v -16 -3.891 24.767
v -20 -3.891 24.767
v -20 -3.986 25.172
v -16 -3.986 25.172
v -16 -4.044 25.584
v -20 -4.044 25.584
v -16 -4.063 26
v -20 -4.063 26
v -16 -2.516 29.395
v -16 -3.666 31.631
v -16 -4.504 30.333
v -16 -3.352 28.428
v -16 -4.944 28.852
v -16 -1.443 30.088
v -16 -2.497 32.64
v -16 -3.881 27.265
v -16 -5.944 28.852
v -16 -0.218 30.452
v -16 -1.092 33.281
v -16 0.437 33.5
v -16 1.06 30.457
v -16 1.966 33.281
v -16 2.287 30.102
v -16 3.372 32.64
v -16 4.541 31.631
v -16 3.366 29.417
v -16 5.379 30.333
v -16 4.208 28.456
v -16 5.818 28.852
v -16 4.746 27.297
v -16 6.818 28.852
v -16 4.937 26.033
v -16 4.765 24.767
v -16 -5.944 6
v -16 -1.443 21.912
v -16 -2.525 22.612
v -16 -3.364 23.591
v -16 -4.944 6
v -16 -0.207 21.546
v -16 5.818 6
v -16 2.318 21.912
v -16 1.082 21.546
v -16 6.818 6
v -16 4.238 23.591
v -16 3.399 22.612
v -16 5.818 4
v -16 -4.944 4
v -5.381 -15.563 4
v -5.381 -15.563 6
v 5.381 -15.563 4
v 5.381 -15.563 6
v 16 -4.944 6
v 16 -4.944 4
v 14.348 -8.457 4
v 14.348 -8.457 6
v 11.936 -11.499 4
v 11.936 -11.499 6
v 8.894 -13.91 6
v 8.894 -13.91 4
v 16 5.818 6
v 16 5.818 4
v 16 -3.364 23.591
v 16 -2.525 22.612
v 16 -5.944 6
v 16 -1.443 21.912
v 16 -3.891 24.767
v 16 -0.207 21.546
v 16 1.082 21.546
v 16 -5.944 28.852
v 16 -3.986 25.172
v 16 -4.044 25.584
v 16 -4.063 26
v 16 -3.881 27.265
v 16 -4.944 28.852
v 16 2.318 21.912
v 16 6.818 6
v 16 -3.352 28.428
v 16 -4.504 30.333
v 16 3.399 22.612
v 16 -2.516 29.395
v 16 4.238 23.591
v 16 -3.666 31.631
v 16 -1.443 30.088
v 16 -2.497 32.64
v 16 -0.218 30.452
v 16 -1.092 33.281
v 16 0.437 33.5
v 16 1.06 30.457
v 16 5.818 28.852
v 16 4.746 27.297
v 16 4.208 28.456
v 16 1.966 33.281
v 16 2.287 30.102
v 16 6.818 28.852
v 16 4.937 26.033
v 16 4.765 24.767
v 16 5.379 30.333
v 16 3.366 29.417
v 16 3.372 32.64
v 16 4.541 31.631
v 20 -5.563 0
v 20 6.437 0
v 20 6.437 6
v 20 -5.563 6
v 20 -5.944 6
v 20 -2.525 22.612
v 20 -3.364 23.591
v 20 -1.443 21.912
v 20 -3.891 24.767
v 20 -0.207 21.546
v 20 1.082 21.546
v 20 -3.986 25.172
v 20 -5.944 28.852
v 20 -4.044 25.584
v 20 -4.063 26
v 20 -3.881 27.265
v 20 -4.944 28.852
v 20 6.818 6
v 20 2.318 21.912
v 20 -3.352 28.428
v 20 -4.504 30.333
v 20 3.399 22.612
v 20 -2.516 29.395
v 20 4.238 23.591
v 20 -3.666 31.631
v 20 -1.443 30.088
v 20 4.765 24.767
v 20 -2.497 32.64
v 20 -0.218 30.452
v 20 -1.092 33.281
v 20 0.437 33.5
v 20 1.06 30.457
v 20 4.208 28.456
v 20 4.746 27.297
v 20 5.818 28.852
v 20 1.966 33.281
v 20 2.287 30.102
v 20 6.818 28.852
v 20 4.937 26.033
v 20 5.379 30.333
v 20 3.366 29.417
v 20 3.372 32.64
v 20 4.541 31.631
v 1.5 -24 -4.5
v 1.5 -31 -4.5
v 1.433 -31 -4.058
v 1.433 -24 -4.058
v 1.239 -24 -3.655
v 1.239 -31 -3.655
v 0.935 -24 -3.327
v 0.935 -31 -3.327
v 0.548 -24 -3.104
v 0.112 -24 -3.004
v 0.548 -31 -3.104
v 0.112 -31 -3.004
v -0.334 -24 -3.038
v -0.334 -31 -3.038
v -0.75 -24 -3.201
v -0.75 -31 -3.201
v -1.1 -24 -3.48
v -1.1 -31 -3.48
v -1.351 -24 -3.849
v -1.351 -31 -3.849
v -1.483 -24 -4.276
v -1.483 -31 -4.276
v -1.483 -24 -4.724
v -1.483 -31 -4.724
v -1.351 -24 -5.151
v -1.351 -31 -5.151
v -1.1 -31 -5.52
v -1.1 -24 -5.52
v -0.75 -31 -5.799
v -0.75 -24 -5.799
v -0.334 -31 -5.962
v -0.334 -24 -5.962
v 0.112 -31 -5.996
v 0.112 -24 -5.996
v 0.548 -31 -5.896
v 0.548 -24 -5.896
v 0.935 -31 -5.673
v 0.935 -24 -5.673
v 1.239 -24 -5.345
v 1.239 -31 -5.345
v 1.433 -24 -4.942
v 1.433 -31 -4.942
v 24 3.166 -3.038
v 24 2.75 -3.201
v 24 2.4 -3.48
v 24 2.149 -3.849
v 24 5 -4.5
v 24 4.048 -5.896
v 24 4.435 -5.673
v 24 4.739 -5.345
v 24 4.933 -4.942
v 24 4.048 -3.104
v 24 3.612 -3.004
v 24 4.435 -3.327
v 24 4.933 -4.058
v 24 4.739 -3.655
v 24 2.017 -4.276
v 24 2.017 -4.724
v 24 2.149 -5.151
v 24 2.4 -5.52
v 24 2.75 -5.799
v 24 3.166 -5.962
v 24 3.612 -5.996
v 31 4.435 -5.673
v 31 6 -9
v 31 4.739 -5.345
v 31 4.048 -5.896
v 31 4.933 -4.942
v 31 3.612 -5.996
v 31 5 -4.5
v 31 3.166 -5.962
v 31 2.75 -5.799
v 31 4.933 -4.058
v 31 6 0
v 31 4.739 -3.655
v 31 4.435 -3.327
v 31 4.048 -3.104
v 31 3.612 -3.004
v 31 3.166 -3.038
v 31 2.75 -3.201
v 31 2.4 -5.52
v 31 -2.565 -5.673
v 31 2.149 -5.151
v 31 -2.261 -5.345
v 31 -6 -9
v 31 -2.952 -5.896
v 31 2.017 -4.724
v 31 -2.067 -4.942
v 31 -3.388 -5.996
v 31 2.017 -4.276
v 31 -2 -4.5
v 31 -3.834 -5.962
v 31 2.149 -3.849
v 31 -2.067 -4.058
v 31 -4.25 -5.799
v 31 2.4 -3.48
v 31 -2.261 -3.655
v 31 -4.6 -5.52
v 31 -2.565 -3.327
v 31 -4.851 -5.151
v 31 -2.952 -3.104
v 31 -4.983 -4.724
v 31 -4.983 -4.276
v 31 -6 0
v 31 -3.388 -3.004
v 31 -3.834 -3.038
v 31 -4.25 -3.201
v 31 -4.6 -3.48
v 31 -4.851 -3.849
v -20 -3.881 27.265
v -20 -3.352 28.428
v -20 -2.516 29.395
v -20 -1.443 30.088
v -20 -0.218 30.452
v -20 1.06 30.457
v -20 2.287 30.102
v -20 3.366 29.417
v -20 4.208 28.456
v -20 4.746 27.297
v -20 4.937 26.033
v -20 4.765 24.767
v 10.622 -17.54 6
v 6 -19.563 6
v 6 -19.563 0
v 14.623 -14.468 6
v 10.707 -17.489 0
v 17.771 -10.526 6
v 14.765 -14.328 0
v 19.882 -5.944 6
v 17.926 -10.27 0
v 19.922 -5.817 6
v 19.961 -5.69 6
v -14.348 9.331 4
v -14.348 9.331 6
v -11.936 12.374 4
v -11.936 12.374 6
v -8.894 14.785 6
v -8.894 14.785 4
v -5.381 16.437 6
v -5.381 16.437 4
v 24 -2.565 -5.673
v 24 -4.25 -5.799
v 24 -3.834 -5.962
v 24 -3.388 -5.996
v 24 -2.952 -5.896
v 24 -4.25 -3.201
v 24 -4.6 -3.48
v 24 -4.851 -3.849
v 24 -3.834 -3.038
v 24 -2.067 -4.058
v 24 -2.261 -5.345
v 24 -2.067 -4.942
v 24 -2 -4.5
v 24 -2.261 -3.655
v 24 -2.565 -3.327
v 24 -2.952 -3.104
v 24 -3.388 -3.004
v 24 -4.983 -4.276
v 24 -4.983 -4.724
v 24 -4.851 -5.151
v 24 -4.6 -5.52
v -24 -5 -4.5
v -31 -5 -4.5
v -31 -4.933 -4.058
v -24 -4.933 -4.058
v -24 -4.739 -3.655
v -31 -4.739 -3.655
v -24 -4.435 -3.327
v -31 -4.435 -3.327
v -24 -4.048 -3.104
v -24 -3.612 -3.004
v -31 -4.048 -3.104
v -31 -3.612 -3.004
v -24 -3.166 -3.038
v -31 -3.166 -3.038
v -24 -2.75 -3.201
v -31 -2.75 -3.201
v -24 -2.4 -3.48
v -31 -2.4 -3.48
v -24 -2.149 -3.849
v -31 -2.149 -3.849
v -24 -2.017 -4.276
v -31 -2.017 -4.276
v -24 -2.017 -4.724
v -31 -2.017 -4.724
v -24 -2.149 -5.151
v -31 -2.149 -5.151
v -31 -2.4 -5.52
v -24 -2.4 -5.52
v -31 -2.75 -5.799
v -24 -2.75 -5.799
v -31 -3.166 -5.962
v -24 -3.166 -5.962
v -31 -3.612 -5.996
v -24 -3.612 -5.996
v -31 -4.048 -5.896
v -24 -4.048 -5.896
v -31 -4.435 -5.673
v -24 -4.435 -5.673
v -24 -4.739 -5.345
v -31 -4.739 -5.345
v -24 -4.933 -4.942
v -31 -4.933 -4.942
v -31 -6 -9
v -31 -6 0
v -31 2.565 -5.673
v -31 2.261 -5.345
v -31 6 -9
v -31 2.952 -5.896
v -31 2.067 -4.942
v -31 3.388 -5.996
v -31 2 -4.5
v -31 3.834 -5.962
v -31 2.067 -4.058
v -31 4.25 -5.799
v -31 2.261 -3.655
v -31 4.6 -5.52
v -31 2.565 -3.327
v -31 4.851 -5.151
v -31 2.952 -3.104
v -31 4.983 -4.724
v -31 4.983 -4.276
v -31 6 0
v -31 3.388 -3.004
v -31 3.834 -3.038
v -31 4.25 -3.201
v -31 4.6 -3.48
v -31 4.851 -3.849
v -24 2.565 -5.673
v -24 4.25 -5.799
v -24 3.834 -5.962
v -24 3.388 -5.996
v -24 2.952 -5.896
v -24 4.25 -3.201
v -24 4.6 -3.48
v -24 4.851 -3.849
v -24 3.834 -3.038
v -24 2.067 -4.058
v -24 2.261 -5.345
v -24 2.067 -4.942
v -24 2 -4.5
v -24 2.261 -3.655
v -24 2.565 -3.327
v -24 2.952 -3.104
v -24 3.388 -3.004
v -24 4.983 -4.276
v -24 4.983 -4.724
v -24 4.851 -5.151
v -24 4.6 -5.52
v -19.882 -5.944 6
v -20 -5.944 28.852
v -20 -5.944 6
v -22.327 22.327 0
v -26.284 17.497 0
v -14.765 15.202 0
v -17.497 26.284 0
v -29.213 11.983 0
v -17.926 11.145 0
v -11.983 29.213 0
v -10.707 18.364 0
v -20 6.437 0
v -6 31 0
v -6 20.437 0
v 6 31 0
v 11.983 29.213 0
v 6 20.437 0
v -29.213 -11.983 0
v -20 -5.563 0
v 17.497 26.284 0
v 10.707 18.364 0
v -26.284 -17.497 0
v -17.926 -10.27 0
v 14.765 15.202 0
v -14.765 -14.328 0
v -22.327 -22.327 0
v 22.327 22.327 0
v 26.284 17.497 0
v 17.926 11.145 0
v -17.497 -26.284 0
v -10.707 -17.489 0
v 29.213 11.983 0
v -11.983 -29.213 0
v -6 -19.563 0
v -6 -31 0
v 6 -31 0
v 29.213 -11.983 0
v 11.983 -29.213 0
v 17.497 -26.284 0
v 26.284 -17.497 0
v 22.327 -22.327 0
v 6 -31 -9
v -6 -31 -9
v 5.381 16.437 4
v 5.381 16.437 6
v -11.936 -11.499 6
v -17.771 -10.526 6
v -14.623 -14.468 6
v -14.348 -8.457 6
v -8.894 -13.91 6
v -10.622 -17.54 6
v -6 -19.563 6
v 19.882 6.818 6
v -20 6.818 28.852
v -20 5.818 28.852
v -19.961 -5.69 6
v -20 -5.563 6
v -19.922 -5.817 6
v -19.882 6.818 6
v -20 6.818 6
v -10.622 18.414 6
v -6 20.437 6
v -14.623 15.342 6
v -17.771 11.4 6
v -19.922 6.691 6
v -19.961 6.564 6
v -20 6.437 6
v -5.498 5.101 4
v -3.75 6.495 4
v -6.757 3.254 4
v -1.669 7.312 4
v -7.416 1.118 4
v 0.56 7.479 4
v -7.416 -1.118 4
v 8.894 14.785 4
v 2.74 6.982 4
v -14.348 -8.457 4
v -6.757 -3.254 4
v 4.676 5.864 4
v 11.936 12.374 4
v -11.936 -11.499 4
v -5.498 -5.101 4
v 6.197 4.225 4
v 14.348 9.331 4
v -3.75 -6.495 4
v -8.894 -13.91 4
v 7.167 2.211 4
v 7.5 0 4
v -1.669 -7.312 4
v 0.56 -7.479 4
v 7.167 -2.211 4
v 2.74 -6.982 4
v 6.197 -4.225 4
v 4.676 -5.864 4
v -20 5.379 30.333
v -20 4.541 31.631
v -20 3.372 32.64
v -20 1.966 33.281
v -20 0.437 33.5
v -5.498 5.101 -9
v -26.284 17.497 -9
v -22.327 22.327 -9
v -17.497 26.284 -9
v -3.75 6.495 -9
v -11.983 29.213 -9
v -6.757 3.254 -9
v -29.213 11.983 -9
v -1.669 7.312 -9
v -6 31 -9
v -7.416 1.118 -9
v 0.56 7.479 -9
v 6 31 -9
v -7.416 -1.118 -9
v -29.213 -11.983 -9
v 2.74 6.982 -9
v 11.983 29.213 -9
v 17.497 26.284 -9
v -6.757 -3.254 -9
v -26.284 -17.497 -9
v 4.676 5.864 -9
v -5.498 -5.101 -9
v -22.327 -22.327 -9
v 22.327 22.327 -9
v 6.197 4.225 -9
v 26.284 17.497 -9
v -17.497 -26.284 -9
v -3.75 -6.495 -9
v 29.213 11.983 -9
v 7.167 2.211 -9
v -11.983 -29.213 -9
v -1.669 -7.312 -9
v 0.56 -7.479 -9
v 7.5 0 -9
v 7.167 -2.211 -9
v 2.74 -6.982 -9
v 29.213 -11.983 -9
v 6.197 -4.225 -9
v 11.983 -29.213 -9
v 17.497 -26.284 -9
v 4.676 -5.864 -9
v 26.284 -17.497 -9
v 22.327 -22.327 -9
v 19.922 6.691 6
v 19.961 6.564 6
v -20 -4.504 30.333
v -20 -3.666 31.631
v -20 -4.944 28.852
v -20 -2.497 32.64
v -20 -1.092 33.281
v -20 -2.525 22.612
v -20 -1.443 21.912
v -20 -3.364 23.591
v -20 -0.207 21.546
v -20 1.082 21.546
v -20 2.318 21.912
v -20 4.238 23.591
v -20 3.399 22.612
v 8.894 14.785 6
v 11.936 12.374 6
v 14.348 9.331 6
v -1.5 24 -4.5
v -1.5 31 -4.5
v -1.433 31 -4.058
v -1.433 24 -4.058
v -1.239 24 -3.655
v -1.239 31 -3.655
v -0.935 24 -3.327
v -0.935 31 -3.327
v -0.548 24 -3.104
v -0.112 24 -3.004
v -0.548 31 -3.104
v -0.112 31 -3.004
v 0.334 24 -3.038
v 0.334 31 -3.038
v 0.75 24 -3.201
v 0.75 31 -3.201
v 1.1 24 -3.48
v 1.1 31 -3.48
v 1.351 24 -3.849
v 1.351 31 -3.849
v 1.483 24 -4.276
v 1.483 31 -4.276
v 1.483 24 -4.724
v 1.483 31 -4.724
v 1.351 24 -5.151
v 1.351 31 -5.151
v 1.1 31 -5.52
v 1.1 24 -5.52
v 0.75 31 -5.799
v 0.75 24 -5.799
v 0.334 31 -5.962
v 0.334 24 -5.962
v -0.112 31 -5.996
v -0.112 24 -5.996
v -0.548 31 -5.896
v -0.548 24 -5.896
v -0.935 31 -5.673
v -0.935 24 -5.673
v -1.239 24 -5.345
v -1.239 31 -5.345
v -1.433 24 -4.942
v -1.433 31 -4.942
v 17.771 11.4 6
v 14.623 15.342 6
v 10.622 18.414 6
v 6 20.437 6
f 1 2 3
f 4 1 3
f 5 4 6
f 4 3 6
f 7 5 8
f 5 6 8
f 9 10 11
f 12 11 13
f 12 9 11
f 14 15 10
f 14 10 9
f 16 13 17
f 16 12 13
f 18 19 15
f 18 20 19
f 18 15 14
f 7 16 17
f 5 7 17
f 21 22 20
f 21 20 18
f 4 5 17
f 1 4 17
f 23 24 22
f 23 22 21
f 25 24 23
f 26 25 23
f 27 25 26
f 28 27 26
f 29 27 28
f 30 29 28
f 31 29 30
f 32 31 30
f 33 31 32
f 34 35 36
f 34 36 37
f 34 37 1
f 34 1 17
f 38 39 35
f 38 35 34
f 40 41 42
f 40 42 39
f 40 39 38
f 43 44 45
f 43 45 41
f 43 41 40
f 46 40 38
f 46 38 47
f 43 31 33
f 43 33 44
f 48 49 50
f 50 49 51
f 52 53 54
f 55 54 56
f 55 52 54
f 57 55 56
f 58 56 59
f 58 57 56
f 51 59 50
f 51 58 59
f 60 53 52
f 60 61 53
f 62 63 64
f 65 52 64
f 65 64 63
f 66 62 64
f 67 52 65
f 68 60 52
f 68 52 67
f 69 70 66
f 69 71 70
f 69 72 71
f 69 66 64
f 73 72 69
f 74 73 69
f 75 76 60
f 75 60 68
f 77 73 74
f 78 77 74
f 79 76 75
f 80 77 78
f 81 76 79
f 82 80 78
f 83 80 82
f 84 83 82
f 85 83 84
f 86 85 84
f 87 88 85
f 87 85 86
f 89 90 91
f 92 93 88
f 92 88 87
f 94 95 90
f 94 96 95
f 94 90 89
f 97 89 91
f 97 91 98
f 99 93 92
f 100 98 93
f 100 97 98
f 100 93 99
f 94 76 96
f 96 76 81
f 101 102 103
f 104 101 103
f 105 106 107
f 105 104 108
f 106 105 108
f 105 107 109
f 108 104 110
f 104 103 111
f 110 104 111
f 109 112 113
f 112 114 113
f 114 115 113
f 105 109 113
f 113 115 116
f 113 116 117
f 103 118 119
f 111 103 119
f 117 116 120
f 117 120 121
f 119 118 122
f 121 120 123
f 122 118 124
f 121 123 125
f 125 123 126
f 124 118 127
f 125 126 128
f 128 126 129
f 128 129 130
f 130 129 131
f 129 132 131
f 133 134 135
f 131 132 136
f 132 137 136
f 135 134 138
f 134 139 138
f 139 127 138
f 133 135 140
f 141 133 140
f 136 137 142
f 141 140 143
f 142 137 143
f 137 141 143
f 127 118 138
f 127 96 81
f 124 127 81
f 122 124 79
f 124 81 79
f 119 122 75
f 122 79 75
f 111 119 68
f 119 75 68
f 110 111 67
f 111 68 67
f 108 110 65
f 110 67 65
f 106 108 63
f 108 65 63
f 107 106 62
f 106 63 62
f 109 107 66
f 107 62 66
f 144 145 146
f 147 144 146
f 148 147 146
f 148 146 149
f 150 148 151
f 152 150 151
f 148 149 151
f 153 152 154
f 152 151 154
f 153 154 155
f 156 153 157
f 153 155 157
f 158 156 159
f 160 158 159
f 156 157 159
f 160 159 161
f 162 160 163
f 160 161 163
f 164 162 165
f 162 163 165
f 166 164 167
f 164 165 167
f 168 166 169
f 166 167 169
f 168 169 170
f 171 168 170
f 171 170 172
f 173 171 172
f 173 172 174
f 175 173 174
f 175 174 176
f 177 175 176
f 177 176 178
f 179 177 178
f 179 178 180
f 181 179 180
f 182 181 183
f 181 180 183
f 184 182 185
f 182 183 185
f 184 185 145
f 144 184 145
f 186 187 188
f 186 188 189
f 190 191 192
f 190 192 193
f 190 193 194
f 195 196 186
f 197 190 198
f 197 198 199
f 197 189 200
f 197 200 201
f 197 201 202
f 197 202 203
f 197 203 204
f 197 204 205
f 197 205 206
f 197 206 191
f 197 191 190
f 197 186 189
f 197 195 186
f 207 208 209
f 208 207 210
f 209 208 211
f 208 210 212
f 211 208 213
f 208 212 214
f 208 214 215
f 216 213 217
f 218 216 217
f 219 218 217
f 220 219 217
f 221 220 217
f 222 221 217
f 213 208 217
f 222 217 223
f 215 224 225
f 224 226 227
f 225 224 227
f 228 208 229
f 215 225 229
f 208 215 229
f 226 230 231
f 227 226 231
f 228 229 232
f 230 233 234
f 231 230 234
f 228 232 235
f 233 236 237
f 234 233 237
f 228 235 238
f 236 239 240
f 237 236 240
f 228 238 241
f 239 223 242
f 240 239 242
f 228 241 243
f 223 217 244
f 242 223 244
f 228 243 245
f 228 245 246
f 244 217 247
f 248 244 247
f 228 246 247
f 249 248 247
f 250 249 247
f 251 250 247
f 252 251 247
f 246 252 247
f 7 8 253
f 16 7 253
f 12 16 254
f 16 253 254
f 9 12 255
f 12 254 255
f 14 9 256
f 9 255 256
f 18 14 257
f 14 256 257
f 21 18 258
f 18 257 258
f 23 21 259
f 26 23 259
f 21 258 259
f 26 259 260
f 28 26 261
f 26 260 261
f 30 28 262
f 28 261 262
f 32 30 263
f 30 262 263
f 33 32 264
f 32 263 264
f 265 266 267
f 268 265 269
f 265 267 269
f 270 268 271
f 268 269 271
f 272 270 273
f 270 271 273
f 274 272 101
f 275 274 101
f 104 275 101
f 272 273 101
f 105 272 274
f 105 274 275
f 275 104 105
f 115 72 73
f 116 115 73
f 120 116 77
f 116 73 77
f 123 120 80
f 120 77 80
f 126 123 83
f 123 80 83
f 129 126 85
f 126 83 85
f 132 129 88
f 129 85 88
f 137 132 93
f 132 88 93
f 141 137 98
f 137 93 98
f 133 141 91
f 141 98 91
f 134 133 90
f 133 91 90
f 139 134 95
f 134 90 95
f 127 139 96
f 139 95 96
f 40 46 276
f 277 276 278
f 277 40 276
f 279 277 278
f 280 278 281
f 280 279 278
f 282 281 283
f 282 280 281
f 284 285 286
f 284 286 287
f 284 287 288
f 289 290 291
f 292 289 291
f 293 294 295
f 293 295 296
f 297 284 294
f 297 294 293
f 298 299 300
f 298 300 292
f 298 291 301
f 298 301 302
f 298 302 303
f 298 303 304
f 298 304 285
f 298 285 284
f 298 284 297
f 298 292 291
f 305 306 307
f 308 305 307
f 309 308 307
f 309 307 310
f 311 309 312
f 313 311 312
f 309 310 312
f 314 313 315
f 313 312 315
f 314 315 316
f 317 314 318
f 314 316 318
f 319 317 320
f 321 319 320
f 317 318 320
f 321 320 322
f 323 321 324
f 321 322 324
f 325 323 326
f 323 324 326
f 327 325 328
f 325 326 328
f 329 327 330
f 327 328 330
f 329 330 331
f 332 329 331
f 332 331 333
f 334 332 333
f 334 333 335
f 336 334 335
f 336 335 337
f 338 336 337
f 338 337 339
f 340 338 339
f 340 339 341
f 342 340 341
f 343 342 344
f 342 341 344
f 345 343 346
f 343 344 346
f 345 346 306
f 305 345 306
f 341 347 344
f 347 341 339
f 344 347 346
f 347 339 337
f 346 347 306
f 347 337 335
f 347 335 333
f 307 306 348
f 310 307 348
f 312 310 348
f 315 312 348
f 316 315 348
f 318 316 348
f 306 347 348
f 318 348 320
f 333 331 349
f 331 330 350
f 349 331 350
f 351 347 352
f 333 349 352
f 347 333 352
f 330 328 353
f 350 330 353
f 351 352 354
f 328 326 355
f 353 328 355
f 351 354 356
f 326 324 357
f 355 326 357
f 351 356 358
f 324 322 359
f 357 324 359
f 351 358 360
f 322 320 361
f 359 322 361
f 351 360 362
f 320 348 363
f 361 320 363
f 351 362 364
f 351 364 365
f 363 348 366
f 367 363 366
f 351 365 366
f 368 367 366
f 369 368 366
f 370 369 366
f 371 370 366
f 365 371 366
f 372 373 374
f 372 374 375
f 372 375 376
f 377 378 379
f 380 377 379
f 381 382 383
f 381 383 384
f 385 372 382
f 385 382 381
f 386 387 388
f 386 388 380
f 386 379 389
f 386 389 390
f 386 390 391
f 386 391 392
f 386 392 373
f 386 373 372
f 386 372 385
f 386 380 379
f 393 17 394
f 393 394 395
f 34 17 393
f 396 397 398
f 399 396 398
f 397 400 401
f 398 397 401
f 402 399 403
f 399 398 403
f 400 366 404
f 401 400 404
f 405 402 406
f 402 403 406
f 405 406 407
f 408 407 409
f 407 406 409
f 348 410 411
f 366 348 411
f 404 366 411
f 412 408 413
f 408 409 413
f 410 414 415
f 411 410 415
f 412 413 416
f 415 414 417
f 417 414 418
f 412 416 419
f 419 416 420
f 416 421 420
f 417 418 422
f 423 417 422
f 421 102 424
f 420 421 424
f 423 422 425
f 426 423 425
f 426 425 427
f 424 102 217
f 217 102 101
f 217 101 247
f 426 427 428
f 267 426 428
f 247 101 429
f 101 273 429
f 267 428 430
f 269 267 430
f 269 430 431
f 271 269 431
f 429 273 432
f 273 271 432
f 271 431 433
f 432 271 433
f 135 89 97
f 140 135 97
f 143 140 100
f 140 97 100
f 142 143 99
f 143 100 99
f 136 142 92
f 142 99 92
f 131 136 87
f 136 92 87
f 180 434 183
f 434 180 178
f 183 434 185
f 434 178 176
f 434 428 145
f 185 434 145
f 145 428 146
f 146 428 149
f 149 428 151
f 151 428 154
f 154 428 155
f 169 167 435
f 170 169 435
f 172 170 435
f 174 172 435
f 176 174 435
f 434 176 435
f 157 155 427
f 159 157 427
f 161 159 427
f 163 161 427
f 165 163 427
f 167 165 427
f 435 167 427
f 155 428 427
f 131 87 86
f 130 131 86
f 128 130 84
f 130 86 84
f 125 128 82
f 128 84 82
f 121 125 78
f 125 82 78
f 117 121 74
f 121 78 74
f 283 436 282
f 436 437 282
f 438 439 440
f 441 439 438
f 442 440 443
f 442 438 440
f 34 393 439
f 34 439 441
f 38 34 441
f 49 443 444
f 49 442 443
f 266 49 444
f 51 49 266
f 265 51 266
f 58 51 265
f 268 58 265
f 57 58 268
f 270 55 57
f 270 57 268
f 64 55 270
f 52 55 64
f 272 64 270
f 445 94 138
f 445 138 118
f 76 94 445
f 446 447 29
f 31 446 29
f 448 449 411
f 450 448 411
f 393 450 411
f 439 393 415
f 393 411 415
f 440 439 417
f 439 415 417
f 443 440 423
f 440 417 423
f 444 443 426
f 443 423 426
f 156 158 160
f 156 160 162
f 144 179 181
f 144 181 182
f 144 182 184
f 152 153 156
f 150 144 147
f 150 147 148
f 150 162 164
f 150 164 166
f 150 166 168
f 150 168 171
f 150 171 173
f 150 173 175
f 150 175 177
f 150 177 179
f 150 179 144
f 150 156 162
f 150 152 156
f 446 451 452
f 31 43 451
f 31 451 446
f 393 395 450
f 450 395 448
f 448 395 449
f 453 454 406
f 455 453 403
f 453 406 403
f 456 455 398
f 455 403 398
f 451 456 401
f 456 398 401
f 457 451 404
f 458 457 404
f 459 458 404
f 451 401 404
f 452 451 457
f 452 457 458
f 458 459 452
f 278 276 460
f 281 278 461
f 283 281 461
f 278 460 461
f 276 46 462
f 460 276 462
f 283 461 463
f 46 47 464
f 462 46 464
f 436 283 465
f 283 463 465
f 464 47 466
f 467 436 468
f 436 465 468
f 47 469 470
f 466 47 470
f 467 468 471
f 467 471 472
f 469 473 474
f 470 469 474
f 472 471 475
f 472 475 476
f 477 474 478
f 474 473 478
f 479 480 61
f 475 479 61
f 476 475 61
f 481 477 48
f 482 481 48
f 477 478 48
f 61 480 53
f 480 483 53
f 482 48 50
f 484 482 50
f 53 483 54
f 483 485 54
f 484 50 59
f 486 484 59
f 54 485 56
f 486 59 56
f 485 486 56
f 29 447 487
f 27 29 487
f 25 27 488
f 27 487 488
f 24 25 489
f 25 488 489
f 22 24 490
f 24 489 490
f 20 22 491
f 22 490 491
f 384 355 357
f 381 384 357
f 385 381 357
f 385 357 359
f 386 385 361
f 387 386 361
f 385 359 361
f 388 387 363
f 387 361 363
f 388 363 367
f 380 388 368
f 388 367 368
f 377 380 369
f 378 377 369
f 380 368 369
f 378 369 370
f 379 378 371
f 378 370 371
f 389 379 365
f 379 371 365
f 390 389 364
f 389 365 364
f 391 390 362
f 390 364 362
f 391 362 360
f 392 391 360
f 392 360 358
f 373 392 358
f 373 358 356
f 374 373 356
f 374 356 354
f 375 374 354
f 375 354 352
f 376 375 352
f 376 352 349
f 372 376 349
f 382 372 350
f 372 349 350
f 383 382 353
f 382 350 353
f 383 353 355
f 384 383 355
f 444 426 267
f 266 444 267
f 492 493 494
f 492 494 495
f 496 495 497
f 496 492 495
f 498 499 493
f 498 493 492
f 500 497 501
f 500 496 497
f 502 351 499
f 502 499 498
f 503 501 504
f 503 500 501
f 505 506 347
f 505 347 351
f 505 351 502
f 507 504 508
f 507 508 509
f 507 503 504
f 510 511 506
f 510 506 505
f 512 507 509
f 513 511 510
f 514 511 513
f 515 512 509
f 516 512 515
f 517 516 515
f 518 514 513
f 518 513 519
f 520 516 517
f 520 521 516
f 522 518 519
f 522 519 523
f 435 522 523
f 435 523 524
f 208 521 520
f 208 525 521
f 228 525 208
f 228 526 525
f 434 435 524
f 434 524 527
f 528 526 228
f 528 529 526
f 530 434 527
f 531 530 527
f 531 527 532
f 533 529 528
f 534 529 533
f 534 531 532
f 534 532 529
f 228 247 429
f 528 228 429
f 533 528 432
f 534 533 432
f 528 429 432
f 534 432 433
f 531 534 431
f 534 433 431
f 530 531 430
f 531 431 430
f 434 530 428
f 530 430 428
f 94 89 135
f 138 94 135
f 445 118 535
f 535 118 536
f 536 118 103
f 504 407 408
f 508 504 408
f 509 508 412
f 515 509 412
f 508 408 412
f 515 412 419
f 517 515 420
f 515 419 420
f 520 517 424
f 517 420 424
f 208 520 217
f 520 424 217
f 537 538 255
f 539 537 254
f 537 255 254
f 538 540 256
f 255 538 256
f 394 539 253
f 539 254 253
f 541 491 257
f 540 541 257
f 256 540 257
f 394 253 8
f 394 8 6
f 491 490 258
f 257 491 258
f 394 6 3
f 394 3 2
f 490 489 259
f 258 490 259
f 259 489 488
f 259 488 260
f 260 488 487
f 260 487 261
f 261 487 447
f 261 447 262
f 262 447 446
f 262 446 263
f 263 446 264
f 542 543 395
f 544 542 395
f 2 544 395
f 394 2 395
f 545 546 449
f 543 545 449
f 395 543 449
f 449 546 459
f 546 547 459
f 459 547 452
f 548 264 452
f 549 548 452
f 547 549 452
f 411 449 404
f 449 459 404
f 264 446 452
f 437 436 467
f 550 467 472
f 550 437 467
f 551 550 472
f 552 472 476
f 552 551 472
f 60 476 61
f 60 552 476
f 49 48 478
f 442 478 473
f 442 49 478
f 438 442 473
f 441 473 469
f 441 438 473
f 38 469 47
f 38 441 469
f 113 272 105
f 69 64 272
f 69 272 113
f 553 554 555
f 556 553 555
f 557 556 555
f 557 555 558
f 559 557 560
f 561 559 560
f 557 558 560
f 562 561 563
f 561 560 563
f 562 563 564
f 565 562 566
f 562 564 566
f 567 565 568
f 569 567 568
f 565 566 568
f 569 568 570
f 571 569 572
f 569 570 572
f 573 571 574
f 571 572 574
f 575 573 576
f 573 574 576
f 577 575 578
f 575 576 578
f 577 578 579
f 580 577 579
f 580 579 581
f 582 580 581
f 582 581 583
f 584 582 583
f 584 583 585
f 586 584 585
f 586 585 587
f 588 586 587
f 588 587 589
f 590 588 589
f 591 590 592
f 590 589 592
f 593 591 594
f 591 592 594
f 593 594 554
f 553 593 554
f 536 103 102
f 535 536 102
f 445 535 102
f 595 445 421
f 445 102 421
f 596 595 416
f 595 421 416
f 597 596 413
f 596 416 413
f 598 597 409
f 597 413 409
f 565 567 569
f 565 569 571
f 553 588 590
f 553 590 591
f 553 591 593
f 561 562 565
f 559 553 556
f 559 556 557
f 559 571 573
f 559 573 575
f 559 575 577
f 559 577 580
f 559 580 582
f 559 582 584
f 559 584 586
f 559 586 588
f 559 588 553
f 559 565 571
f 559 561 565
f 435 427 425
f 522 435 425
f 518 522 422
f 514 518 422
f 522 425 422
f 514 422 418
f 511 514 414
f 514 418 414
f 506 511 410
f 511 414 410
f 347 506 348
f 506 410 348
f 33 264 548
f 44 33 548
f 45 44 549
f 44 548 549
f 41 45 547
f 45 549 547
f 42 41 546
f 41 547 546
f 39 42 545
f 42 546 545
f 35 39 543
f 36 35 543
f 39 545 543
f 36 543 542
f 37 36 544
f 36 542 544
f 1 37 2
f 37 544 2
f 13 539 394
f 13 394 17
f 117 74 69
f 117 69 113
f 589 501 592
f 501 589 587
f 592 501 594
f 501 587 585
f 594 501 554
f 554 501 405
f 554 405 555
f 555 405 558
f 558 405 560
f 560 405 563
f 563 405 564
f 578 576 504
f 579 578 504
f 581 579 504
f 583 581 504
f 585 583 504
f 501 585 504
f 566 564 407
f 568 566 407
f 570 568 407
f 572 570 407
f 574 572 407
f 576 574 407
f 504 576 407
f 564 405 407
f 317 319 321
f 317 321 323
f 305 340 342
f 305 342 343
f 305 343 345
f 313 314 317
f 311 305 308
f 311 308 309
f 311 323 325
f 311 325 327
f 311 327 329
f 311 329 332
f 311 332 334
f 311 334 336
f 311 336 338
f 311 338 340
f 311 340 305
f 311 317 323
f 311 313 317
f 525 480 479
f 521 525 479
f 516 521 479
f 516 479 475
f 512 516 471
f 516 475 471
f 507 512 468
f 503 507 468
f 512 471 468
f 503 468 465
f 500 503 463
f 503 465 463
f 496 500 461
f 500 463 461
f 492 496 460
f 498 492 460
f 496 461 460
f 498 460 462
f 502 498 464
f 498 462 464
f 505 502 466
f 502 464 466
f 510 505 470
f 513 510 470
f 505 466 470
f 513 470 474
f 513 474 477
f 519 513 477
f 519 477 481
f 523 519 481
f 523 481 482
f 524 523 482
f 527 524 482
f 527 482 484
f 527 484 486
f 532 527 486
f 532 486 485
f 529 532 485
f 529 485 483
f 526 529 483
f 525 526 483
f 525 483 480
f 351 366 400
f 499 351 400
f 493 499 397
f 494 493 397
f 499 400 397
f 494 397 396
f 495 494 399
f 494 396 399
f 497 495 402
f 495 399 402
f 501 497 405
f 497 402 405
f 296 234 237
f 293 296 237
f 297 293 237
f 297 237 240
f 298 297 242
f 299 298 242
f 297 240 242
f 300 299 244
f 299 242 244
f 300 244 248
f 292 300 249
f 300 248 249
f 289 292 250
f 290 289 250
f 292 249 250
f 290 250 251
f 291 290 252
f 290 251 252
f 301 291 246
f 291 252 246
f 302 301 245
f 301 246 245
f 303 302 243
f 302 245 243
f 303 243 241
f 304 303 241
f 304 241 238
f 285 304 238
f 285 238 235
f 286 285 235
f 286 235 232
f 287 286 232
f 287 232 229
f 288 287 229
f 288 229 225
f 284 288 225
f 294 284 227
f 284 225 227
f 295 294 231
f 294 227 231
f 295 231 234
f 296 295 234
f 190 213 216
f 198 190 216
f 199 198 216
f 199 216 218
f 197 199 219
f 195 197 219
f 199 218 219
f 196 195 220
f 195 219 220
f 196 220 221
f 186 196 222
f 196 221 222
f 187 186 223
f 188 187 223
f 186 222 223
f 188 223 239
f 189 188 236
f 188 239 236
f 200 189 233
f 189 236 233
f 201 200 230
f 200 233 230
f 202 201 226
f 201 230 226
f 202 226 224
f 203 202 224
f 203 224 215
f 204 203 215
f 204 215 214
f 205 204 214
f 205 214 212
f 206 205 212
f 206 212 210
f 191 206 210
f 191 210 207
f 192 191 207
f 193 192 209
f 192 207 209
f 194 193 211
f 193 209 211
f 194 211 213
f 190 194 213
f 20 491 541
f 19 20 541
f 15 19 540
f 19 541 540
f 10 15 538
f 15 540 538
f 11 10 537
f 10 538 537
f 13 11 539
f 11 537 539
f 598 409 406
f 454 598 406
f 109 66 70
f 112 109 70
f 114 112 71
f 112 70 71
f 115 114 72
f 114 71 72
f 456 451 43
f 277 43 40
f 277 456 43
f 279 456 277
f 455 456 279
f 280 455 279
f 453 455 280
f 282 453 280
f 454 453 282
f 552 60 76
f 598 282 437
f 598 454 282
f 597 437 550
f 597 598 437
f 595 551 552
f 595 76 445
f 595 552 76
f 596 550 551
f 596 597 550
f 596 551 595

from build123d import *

# Parameters (mm, degrees)
F1_DEPTH  = 6
F2_T      = -4
F3_DEPTH  = 25.4
F4_W      = 10.761987894
F4_H      = 6
F4_H_2    = 27.5
F5_DEPTH  = 4
F6_W      = 10.761987894
F6_H      = 6
F6_H_2    = 27.5
F7_DEPTH  = 4
F9_DEPTH  = 50
F10_DEPTH = 50
F11_DEPTH = 50
F12_DEPTH = 1
F13_DEPTH = 1
F14_DEPTH = 1
F15_DEPTH = 1
F18_DEPTH = 4
F20_DEPTH = 9
F21_R     = 1.5
F22_DEPTH = 7
F23_R     = 1.5
F24_DEPTH = 7
F25_R     = 1.5
F26_DEPTH = 7
F27_R     = 1.5
F28_DEPTH = 7
F29_R     = 7.5
F30_DEPTH = 25.4


with BuildPart() as f1:
    # F0 (on Top) → F1 (new body)
    with BuildSketch(Plane.XY):
        with BuildLine():
            Line((6.0000014261, 20.4372135154), (1.4261e-06, 20.4372135154))
            Line((1.4261e-06, 20.4372135154), (-5.9999985739, 20.4372135154))
            ThreePointArc((-5.9999985739, 20.4372135154), (-14.7648216341, 15.2020365756), (-19.9999985739, 6.4372135154))
            Line((-19.9999985739, 6.4372135154), (-19.9999985739, 0.4372135154))
            Line((-19.9999985739, 0.4372135154), (-19.9999985739, -5.5627864846))
            ThreePointArc((-19.9999985739, -5.5627864846), (-14.7648216341, -14.3276095448), (-5.9999985739, -19.5627864846))
            Line((-5.9999985739, -19.5627864846), (1.4261e-06, -19.5627864846))
            Line((1.4261e-06, -19.5627864846), (6.0000014261, -19.5627864846))
            ThreePointArc((6.0000014261, -19.5627864846), (14.7648244863, -14.3276095448), (20.0000014261, -5.5627864846))
            Line((20.0000014261, -5.5627864846), (20.0000014261, 6.4372135154))
            ThreePointArc((20.0000014261, 6.4372135154), (14.7648244863, 15.2020365756), (6.0000014261, 20.4372135154))
        make_face()
    extrude(amount=F1_DEPTH)

    # F2
    f2_openings = [f1.faces().sort_by_distance(p)[0] for p in [
        (1e-06, 0.437214, 6),
    ]]
    offset(amount=F2_T, openings=f2_openings)

    # F3 (cut): a face of the model
    f3_faces = [f1.faces().sort_by_distance(p)[0] for p in [
        (1.4261e-06, 0.4372135154, 4),
    ]]
    extrude(f3_faces, amount=-F3_DEPTH, mode=Mode.SUBTRACT)

    # F4 (on face) → F5 (join)
    with BuildSketch(Plane(origin=(16.0000014261, 0, 0), x_dir=(0, -1, 0), z_dir=(-1, 0, 0))):
        with Locations((-0.4372135154, 3)):
            Rectangle(F4_W, F4_H)
        with Locations((-0.4372135154, 19.75)):
            Rectangle(F4_W, F4_H_2)
    extrude(amount=-F5_DEPTH)

    # F6 (on face) → F7 (join)
    with BuildSketch(Plane.YZ.offset(-15.9999985739)):
        with Locations((0.4372135154, 3)):
            Rectangle(F6_W, F6_H)
        with Locations((0.4372135154, 19.75)):
            Rectangle(F6_W, F6_H_2)
    extrude(amount=-F7_DEPTH)

    # F8 (on face) → F9 (cut)
    with BuildSketch(Plane(origin=(-19.9999985739, 0, 0), x_dir=(0, -1, 0), z_dir=(-1, 0, 0))):
        with BuildLine():
            Line((-5.8182074624, 33.5), (-5.8182074624, 28.852354537))
            ThreePointArc((-5.8182074624, 28.852354537), (-3.9923402433, 32.177236302), (-0.4372135154, 33.5))
            Line((-0.4372135154, 33.5), (-5.8182074624, 33.5))
        make_face()
    extrude(amount=-F9_DEPTH, mode=Mode.SUBTRACT)

    # F8 (on face) → F10 (cut)
    with BuildSketch(Plane(origin=(-19.9999985739, 0, 0), x_dir=(0, -1, 0), z_dir=(-1, 0, 0))):
        with BuildLine():
            ThreePointArc((-0.4372135154, 33.5), (3.1179132125, 32.177236302), (4.9437804316, 28.852354537))
            Line((4.9437804316, 28.852354537), (4.9437804316, 33.5))
            Line((4.9437804316, 33.5), (-0.4372135154, 33.5))
        make_face()
    extrude(amount=-F10_DEPTH, mode=Mode.SUBTRACT)

    # F8 (on face) → F11 (cut)
    with BuildSketch(Plane(origin=(-19.9999985739, 0, 0), x_dir=(0, -1, 0), z_dir=(-1, 0, 0))):
        with BuildLine():
            ThreePointArc((3.8905718212, 24.7670060502), (4.0195248668, 25.3775186809), (4.0627864846, 26))
            ThreePointArc((4.0627864846, 26), (-1.0596948345, 30.4567383822), (-4.764998852, 24.7670060502))
            ThreePointArc((-4.764998852, 24.7670060502), (-0.4372135154, 21.5), (3.8905718212, 24.7670060502))
        make_face()
    extrude(amount=-F11_DEPTH, mode=Mode.SUBTRACT)

    # F12 (add): a face of the model
    f12_faces = [f1.faces().sort_by_distance(p)[0] for p in [
        (-17.9999985739, 5.8182074624, 17.4261772685),
    ]]
    extrude(f12_faces, amount=F12_DEPTH)

    # F13 (add): a face of the model
    f13_faces = [f1.faces().sort_by_distance(p)[0] for p in [
        (-17.9999985739, -4.9437804316, 17.4261772685),
    ]]
    extrude(f13_faces, amount=F13_DEPTH)

    # F14 (add): a face of the model
    f14_faces = [f1.faces().sort_by_distance(p)[0] for p in [
        (18.0000014261, 5.8182074624, 17.4261772685),
    ]]
    extrude(f14_faces, amount=F14_DEPTH)

    # F15 (add): a face of the model
    f15_faces = [f1.faces().sort_by_distance(p)[0] for p in [
        (18.0000014261, -4.9437804316, 17.4261772685),
    ]]
    extrude(f15_faces, amount=F15_DEPTH)

    # F17 (on face) → F18 (join)
    with BuildSketch(Plane(origin=(0, 0, 0), x_dir=(1, 0, 0), z_dir=(0, 0, -1))):
        with BuildLine():
            Line((1.4261e-06, 15.5627864846), (1.4261e-06, -0.4372135154))
            Line((1.4261e-06, -0.4372135154), (16.0000014261, -0.4372135154))
            Line((16.0000014261, -0.4372135154), (16.0000014261, 4.9437804316))
            ThreePointArc((16.0000014261, 4.9437804316), (11.9363973616, 11.4991824201), (5.3809953731, 15.5627864846))
            Line((5.3809953731, 15.5627864846), (1.4261e-06, 15.5627864846))
        make_face()
        with BuildLine():
            Line((-15.9999985739, 4.9437804316), (-15.9999985739, -0.4372135154))
            Line((-15.9999985739, -0.4372135154), (1.4261e-06, -0.4372135154))
            Line((1.4261e-06, -0.4372135154), (1.4261e-06, 15.5627864846))
            Line((1.4261e-06, 15.5627864846), (-5.3809925209, 15.5627864846))
            ThreePointArc((-5.3809925209, 15.5627864846), (-11.9363945094, 11.4991824201), (-15.9999985739, 4.9437804316))
        make_face()
        with BuildLine():
            Line((1.4261e-06, -0.4372135154), (-15.9999985739, -0.4372135154))
            Line((-15.9999985739, -0.4372135154), (-15.9999985739, -5.8182074624))
            ThreePointArc((-15.9999985739, -5.8182074624), (-11.9363945094, -12.3736094509), (-5.3809925209, -16.4372135154))
            Line((-5.3809925209, -16.4372135154), (1.4261e-06, -16.4372135154))
            Line((1.4261e-06, -16.4372135154), (1.4261e-06, -0.4372135154))
        make_face()
        with BuildLine():
            Line((16.0000014261, -0.4372135154), (1.4261e-06, -0.4372135154))
            Line((1.4261e-06, -0.4372135154), (1.4261e-06, -16.4372135154))
            Line((1.4261e-06, -16.4372135154), (5.3809953731, -16.4372135154))
            ThreePointArc((5.3809953731, -16.4372135154), (11.9363973616, -12.3736094509), (16.0000014261, -5.8182074624))
            Line((16.0000014261, -5.8182074624), (16.0000014261, -0.4372135154))
        make_face()
    extrude(amount=-F18_DEPTH)

    # F19 (on face) → F20 (join)
    with BuildSketch(Plane(origin=(0, 0, 0), x_dir=(1, 0, 0), z_dir=(0, 0, -1))):
        with BuildLine():
            Line((6, 31), (0, 31))
            Line((0, 31), (-6, 31))
            ThreePointArc((-6, 31), (-22.3271135618, 22.3271135618), (-31, 6))
            Line((-31, 6), (-31, -6))
            ThreePointArc((-31, -6), (-22.3271135618, -22.3271135618), (-6, -31))
            Line((-6, -31), (6, -31))
            ThreePointArc((6, -31), (22.3271135618, -22.3271135618), (31, -6))
            Line((31, -6), (31, 0))
            Line((31, 0), (31, 6))
            ThreePointArc((31, 6), (22.3271135618, 22.3271135618), (6, 31))
        make_face()
    extrude(amount=F20_DEPTH)

    # F21 (on face) → F22 (cut)
    with BuildSketch(Plane.XZ.offset(31)):
        with Locations((0, -4.4999574302)):
            Circle(F21_R)
    extrude(amount=-F22_DEPTH, mode=Mode.SUBTRACT)

    # F23 (on face) → F24 (cut)
    with BuildSketch(Plane(origin=(0, 31, 0), x_dir=(-1, 0, 0), z_dir=(0, 1, 0))):
        with Locations((0, -4.5)):
            Circle(F23_R)
    extrude(amount=-F24_DEPTH, mode=Mode.SUBTRACT)

    # F25 (on face) → F26 (cut)
    with BuildSketch(Plane.YZ.offset(31)):
        with Locations((-3.5, -4.5)):
            Circle(F25_R)
        with Locations((3.5, -4.5)):
            Circle(F25_R)
    extrude(amount=-F26_DEPTH, mode=Mode.SUBTRACT)

    # F27 (on face) → F28 (cut)
    with BuildSketch(Plane(origin=(-31, 0, 0), x_dir=(0, -1, 0), z_dir=(-1, 0, 0))):
        with Locations((-3.5, -4.5)):
            Circle(F27_R)
        with Locations((3.5, -4.5)):
            Circle(F27_R)
    extrude(amount=-F28_DEPTH, mode=Mode.SUBTRACT)

    # F29 (on face) → F30 (cut)
    with BuildSketch(Plane.XY.offset(4)):
        Circle(F29_R)
    extrude(amount=-F30_DEPTH, mode=Mode.SUBTRACT)


solid = f1.part
